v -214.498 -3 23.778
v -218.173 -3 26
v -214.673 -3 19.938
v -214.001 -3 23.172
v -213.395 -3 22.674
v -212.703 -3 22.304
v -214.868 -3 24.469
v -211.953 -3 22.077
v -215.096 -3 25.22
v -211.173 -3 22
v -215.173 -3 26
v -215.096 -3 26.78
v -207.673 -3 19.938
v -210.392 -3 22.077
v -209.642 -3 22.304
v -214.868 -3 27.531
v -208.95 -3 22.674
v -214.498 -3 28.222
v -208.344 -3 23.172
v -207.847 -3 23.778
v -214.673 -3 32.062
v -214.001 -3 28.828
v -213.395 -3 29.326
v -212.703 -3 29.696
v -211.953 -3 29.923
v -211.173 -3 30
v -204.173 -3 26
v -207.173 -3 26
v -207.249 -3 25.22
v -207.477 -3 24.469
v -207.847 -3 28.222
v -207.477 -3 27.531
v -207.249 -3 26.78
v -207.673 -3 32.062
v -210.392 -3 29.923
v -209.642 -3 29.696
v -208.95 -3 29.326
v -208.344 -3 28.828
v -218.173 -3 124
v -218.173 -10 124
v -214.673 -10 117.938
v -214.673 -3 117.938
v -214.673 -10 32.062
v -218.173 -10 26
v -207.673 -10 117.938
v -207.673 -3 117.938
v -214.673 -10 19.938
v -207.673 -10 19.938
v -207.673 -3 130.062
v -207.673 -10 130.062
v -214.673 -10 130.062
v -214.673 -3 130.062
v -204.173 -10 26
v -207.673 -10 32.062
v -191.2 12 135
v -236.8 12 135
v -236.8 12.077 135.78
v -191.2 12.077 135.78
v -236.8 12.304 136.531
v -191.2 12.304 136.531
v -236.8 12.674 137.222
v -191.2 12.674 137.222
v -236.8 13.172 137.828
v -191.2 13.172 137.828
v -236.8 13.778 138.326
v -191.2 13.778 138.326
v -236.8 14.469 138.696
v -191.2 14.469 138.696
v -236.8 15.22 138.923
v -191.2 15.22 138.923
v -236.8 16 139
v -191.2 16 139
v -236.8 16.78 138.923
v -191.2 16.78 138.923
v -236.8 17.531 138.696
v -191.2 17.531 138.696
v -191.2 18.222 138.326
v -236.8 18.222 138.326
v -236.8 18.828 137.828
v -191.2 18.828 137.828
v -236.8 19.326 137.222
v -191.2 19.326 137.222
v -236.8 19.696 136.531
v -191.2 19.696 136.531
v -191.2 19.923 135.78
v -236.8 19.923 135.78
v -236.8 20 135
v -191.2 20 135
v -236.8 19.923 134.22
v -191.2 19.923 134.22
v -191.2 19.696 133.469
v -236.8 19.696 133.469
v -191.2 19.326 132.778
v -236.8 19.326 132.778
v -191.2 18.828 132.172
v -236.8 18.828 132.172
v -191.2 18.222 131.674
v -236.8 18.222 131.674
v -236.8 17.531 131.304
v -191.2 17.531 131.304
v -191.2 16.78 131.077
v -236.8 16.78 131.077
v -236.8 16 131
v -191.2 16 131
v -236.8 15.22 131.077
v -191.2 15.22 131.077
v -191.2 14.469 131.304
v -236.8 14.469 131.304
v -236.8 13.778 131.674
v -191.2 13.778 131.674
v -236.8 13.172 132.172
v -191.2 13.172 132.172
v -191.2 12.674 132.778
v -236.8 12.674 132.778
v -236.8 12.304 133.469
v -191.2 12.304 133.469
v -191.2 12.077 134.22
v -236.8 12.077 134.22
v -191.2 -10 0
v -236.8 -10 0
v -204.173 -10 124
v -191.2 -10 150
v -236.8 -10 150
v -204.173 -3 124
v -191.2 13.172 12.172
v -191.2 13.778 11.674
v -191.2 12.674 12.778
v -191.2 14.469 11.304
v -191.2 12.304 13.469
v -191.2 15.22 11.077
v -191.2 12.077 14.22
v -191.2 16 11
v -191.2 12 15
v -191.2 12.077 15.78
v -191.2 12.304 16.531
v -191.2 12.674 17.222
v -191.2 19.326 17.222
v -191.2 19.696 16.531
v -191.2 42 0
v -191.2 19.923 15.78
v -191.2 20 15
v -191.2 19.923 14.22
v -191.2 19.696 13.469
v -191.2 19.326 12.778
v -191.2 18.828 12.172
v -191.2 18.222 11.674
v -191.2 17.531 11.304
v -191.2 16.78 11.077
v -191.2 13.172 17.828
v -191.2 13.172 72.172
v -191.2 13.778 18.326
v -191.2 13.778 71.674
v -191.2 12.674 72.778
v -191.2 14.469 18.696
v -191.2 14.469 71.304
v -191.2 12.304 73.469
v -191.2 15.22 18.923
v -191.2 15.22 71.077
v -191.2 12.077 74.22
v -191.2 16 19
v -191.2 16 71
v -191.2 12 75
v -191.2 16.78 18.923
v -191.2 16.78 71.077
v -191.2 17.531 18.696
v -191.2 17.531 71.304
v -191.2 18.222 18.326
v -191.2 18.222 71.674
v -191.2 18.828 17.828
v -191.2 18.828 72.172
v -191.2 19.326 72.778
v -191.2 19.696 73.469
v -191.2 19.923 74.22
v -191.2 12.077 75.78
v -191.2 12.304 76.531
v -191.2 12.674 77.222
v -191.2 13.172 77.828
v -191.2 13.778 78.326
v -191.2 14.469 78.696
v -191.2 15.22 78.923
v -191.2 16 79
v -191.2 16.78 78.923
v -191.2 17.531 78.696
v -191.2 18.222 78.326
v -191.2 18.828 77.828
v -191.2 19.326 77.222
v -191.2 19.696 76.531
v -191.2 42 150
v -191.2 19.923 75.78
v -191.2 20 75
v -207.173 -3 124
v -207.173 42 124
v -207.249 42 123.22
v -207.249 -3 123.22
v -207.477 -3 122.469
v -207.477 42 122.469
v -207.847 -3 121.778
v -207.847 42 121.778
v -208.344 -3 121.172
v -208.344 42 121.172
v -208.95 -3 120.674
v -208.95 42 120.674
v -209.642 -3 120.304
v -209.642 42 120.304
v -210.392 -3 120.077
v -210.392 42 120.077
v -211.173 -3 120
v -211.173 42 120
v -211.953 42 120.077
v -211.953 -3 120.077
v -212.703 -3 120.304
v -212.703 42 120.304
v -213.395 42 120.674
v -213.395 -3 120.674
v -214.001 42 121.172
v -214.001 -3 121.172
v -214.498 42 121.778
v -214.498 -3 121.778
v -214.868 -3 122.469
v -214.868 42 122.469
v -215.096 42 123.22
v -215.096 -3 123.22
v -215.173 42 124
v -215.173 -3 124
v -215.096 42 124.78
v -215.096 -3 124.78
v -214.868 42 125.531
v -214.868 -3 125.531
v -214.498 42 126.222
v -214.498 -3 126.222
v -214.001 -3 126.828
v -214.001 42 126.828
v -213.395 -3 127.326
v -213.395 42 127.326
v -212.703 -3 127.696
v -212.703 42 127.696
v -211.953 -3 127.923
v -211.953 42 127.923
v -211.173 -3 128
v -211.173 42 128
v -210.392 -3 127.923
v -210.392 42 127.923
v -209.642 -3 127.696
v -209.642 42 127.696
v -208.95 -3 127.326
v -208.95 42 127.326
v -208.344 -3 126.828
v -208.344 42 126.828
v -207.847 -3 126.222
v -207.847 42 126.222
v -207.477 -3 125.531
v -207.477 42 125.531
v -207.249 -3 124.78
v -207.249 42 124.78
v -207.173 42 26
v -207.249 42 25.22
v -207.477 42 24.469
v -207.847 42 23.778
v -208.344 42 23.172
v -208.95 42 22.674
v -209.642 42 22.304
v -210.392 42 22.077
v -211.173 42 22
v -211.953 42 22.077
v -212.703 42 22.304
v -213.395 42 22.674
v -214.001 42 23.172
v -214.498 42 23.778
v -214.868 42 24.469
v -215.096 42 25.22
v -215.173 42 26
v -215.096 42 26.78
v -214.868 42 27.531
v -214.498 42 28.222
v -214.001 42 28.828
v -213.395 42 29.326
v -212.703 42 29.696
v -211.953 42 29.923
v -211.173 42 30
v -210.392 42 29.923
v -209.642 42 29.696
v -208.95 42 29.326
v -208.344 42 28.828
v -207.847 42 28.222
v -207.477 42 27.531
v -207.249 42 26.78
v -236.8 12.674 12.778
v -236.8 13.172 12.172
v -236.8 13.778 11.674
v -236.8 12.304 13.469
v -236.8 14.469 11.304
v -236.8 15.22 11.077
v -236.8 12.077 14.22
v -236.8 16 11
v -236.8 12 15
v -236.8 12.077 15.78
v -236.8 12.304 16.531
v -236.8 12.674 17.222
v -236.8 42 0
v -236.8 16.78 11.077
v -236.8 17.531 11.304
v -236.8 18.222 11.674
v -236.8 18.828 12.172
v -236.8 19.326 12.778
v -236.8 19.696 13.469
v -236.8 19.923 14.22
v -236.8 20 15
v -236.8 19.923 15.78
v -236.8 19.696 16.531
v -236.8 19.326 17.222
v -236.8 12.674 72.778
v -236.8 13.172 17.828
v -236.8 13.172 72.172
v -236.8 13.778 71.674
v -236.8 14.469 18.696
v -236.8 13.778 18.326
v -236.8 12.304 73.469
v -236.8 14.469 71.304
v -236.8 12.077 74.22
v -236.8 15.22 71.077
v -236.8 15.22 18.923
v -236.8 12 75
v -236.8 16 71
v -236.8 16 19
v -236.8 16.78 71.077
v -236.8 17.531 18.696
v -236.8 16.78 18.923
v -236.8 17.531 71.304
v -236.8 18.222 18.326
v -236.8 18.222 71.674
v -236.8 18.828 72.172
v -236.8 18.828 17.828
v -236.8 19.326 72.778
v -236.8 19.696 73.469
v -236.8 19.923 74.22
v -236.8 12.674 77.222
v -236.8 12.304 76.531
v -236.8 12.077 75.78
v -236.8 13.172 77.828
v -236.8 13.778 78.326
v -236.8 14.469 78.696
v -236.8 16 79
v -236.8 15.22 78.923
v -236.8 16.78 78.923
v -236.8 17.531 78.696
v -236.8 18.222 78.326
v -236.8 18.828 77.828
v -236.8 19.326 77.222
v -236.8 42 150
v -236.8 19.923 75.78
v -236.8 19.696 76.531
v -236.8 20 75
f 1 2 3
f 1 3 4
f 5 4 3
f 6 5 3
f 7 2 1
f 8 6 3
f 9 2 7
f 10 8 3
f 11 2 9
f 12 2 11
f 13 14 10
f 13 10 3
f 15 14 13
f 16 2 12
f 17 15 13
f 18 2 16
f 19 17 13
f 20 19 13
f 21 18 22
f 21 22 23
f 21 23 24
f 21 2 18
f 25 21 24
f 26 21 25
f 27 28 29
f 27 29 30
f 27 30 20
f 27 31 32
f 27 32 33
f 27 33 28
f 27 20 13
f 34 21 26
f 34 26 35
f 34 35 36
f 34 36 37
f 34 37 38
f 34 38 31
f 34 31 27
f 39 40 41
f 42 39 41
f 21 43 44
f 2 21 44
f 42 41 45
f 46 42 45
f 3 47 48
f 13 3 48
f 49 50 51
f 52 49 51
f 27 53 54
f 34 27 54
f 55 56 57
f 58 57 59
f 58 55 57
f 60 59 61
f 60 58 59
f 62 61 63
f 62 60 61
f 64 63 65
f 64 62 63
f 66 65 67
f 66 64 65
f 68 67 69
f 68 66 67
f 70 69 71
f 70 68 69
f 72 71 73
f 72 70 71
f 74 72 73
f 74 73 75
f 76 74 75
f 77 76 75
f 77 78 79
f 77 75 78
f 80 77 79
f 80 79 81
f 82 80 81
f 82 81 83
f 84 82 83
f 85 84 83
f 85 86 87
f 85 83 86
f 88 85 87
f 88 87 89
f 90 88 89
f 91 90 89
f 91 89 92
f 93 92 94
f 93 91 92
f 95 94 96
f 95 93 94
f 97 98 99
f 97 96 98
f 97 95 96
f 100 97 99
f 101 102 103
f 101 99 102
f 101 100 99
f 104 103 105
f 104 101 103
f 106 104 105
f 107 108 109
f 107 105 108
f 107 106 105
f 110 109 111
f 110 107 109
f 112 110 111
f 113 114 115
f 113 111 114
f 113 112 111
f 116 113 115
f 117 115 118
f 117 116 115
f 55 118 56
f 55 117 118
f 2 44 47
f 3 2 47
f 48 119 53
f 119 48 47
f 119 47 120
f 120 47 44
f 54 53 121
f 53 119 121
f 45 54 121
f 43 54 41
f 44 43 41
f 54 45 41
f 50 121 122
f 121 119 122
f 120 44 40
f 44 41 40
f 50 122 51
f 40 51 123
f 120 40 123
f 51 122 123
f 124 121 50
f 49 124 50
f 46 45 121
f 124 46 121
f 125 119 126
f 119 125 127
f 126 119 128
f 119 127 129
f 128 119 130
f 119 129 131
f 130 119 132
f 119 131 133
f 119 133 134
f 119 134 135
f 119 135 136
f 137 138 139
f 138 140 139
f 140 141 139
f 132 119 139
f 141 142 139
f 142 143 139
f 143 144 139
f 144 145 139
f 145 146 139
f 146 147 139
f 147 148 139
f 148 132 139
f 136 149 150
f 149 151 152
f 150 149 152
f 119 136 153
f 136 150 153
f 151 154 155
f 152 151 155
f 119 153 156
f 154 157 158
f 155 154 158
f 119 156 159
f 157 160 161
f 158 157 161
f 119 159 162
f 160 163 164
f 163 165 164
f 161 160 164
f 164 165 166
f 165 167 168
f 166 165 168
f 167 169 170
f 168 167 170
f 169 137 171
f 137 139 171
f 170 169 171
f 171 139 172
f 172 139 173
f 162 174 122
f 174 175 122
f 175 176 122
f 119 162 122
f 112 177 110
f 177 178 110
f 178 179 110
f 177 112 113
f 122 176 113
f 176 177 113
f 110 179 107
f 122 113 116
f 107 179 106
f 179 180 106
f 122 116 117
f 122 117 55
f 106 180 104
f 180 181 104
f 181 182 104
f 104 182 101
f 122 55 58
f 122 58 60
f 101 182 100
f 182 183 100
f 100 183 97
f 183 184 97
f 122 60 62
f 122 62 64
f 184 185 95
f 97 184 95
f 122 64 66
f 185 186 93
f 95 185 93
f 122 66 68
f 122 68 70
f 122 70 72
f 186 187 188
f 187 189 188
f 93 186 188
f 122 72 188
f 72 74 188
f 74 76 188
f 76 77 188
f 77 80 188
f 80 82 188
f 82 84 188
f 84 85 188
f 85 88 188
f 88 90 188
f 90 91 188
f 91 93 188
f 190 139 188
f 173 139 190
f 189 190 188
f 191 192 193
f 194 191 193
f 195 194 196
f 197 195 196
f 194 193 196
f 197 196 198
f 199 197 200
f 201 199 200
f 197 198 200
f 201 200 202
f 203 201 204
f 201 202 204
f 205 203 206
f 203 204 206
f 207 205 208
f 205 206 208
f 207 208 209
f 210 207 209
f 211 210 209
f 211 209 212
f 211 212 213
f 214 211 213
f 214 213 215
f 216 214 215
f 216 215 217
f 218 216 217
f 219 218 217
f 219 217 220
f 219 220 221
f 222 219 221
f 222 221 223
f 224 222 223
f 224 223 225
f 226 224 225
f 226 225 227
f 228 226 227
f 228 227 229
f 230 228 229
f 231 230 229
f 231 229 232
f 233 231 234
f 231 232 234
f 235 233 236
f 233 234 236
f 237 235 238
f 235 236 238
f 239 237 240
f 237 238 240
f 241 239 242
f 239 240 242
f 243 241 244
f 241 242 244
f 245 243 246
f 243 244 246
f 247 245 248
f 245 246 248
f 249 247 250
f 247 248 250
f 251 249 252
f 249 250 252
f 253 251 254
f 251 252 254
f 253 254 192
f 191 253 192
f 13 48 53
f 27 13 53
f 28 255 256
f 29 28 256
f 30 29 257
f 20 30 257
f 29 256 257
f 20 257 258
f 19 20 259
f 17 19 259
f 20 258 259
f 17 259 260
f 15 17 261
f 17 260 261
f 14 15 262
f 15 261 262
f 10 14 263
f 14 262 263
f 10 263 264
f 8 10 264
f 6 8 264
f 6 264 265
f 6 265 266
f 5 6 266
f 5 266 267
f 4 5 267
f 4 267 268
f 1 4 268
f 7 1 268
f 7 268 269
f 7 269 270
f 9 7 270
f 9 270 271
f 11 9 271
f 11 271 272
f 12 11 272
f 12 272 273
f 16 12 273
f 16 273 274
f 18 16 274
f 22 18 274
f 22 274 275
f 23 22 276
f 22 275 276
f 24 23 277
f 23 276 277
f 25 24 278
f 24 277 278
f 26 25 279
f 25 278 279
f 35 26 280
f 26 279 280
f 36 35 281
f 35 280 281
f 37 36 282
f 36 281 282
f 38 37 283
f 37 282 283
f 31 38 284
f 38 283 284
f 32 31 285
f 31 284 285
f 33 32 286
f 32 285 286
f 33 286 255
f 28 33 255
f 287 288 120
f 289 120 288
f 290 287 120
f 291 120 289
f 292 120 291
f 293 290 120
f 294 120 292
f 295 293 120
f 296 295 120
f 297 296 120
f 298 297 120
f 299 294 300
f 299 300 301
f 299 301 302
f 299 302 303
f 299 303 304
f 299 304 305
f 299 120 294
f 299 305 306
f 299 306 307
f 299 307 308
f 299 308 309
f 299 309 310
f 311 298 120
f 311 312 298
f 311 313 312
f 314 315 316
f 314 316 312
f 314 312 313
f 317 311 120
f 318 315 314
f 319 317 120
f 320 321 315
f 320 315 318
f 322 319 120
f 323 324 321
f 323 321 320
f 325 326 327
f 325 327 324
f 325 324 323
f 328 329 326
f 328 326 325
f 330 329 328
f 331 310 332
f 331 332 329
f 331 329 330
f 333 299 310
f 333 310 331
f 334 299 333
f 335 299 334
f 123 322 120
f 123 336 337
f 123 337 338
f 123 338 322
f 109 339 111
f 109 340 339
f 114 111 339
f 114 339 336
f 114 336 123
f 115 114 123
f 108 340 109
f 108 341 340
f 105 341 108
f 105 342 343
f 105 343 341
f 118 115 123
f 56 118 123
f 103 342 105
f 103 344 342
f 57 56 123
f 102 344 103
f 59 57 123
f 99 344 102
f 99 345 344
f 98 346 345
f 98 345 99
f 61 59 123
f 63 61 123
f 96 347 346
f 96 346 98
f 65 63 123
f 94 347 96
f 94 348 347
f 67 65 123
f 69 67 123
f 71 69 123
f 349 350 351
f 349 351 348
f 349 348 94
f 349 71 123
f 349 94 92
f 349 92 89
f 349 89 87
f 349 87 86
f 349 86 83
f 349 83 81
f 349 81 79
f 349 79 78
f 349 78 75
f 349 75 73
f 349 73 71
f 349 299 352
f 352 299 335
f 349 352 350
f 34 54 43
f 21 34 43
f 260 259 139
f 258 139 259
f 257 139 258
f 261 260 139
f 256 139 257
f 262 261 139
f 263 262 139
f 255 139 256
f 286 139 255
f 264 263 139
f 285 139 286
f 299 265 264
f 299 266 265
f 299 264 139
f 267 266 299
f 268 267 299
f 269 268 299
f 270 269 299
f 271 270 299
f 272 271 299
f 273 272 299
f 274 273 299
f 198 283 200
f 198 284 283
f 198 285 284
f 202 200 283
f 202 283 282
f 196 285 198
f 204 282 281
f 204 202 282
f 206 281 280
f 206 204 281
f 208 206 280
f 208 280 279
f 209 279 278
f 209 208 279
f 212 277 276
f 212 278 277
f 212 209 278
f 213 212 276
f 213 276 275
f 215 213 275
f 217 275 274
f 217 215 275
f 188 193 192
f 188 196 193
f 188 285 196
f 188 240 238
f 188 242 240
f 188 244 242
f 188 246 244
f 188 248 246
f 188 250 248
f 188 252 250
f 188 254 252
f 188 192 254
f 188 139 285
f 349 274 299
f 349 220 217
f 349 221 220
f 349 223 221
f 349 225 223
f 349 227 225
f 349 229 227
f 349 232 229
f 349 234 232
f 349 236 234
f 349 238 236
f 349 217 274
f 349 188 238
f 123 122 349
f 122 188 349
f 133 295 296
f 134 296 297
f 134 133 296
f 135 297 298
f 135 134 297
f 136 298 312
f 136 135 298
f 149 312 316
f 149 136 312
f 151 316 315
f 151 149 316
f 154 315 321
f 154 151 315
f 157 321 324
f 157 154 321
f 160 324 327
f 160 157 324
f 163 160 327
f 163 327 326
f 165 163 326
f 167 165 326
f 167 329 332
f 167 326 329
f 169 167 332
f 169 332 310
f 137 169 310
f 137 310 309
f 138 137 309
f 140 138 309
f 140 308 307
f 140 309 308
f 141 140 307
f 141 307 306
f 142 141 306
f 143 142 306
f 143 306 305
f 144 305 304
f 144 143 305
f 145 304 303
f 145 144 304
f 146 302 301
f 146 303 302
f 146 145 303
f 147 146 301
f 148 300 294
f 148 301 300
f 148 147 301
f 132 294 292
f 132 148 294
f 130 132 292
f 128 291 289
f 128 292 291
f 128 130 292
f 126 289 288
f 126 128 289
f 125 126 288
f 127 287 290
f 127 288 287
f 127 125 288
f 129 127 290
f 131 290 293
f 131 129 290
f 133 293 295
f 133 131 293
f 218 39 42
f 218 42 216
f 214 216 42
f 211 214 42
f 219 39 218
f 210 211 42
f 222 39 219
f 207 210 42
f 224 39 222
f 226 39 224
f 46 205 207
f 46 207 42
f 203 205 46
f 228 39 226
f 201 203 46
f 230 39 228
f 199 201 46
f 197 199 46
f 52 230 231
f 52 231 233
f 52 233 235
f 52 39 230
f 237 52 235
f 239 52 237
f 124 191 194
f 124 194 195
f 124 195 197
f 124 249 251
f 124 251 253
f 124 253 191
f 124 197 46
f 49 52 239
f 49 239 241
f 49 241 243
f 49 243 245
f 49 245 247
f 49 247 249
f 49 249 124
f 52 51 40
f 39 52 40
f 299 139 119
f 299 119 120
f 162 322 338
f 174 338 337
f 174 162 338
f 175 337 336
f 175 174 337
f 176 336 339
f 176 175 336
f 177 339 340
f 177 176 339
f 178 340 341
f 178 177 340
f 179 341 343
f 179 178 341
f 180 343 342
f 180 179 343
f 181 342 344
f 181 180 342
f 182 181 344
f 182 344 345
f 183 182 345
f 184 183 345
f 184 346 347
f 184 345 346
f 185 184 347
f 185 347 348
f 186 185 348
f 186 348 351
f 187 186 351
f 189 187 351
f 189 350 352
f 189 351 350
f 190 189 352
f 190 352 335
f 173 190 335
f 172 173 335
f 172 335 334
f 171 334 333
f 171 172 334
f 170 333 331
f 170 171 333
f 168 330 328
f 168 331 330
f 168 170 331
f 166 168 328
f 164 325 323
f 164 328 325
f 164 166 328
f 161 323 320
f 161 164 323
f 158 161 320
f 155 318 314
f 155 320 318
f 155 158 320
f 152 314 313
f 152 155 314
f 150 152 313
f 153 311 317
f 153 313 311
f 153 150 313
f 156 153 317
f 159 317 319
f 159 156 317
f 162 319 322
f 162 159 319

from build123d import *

# Parameters (mm, degrees)
SKETCH008_W       = 45.6
SKETCH008_H       = 150
PAD004_DEPTH      = 42
PAD004_DEPTH_BACK = 10
SKETCH009_R       = 4
POCKET003_DEPTH   = 52.001
POCKET004_DEPTH   = 7
POCKET005_DEPTH   = 7
SKETCH011_R       = 4
POCKET007_DEPTH   = 45.601


with BuildPart() as part:
    # Sketch008 → Pad004 (new body, two sides)
    with BuildSketch(Plane(origin=(0, 0, 0), x_dir=(-1, 0, 0), z_dir=(0, 1, 0))) as pad004_sk:
        with Locations((214, 75)):
            Rectangle(SKETCH008_W, SKETCH008_H)
    extrude(amount=PAD004_DEPTH)
    extrude(pad004_sk.sketch, amount=-PAD004_DEPTH_BACK)

    # Sketch009 (on Face6 of Pad004) → Pocket003 (cut, through all)
    with BuildSketch(Plane(origin=(0, 42, 0), x_dir=(1, 0, 0), z_dir=(0, 1, 0))):
        with Locations((-211.172606, -26)):
            Circle(SKETCH009_R)
        with Locations((-211.172606, -124)):
            Circle(SKETCH009_R)
    extrude(amount=-POCKET003_DEPTH, mode=Mode.SUBTRACT)

    # Sketch010 (on Face4 of Pocket003) → Pocket004 (cut)
    with BuildSketch(Plane.XZ.offset(10)):
        Polygon((-207.672606, 117.937822), (-204.172606, 124), (-207.672606, 130.062178), (-214.672606, 130.062178), (-218.172606, 124), (-214.672606, 117.937822), align=None)
        Polygon((-207.672606, 19.937822), (-204.172606, 26), (-207.672606, 32.062178), (-214.672606, 32.062178), (-218.172606, 26), (-214.672606, 19.937822), align=None)
    extrude(amount=-POCKET004_DEPTH, mode=Mode.SUBTRACT)

    # Sketch010 (on Face4 of Pocket003) → Pocket005 (cut)
    with BuildSketch(Plane.XZ.offset(10)):
        Polygon((-207.672606, 117.937822), (-204.172606, 124), (-207.672606, 130.062178), (-214.672606, 130.062178), (-218.172606, 124), (-214.672606, 117.937822), align=None)
        Polygon((-207.672606, 19.937822), (-204.172606, 26), (-207.672606, 32.062178), (-214.672606, 32.062178), (-218.172606, 26), (-214.672606, 19.937822), align=None)
    extrude(amount=-POCKET005_DEPTH, mode=Mode.SUBTRACT)

    # Sketch011 → Pocket007 (cut, through all)
    with BuildSketch(Plane(origin=(-191.2, 0, 0), x_dir=(0, -1, 0), z_dir=(-1, 0, 0))):
        with Locations((-16, 135)):
            Circle(SKETCH011_R)
        with Locations((-16, 75)):
            Circle(SKETCH011_R)
        with Locations((-16, 15)):
            Circle(SKETCH011_R)
    extrude(amount=POCKET007_DEPTH, mode=Mode.SUBTRACT)


solid = part.part
